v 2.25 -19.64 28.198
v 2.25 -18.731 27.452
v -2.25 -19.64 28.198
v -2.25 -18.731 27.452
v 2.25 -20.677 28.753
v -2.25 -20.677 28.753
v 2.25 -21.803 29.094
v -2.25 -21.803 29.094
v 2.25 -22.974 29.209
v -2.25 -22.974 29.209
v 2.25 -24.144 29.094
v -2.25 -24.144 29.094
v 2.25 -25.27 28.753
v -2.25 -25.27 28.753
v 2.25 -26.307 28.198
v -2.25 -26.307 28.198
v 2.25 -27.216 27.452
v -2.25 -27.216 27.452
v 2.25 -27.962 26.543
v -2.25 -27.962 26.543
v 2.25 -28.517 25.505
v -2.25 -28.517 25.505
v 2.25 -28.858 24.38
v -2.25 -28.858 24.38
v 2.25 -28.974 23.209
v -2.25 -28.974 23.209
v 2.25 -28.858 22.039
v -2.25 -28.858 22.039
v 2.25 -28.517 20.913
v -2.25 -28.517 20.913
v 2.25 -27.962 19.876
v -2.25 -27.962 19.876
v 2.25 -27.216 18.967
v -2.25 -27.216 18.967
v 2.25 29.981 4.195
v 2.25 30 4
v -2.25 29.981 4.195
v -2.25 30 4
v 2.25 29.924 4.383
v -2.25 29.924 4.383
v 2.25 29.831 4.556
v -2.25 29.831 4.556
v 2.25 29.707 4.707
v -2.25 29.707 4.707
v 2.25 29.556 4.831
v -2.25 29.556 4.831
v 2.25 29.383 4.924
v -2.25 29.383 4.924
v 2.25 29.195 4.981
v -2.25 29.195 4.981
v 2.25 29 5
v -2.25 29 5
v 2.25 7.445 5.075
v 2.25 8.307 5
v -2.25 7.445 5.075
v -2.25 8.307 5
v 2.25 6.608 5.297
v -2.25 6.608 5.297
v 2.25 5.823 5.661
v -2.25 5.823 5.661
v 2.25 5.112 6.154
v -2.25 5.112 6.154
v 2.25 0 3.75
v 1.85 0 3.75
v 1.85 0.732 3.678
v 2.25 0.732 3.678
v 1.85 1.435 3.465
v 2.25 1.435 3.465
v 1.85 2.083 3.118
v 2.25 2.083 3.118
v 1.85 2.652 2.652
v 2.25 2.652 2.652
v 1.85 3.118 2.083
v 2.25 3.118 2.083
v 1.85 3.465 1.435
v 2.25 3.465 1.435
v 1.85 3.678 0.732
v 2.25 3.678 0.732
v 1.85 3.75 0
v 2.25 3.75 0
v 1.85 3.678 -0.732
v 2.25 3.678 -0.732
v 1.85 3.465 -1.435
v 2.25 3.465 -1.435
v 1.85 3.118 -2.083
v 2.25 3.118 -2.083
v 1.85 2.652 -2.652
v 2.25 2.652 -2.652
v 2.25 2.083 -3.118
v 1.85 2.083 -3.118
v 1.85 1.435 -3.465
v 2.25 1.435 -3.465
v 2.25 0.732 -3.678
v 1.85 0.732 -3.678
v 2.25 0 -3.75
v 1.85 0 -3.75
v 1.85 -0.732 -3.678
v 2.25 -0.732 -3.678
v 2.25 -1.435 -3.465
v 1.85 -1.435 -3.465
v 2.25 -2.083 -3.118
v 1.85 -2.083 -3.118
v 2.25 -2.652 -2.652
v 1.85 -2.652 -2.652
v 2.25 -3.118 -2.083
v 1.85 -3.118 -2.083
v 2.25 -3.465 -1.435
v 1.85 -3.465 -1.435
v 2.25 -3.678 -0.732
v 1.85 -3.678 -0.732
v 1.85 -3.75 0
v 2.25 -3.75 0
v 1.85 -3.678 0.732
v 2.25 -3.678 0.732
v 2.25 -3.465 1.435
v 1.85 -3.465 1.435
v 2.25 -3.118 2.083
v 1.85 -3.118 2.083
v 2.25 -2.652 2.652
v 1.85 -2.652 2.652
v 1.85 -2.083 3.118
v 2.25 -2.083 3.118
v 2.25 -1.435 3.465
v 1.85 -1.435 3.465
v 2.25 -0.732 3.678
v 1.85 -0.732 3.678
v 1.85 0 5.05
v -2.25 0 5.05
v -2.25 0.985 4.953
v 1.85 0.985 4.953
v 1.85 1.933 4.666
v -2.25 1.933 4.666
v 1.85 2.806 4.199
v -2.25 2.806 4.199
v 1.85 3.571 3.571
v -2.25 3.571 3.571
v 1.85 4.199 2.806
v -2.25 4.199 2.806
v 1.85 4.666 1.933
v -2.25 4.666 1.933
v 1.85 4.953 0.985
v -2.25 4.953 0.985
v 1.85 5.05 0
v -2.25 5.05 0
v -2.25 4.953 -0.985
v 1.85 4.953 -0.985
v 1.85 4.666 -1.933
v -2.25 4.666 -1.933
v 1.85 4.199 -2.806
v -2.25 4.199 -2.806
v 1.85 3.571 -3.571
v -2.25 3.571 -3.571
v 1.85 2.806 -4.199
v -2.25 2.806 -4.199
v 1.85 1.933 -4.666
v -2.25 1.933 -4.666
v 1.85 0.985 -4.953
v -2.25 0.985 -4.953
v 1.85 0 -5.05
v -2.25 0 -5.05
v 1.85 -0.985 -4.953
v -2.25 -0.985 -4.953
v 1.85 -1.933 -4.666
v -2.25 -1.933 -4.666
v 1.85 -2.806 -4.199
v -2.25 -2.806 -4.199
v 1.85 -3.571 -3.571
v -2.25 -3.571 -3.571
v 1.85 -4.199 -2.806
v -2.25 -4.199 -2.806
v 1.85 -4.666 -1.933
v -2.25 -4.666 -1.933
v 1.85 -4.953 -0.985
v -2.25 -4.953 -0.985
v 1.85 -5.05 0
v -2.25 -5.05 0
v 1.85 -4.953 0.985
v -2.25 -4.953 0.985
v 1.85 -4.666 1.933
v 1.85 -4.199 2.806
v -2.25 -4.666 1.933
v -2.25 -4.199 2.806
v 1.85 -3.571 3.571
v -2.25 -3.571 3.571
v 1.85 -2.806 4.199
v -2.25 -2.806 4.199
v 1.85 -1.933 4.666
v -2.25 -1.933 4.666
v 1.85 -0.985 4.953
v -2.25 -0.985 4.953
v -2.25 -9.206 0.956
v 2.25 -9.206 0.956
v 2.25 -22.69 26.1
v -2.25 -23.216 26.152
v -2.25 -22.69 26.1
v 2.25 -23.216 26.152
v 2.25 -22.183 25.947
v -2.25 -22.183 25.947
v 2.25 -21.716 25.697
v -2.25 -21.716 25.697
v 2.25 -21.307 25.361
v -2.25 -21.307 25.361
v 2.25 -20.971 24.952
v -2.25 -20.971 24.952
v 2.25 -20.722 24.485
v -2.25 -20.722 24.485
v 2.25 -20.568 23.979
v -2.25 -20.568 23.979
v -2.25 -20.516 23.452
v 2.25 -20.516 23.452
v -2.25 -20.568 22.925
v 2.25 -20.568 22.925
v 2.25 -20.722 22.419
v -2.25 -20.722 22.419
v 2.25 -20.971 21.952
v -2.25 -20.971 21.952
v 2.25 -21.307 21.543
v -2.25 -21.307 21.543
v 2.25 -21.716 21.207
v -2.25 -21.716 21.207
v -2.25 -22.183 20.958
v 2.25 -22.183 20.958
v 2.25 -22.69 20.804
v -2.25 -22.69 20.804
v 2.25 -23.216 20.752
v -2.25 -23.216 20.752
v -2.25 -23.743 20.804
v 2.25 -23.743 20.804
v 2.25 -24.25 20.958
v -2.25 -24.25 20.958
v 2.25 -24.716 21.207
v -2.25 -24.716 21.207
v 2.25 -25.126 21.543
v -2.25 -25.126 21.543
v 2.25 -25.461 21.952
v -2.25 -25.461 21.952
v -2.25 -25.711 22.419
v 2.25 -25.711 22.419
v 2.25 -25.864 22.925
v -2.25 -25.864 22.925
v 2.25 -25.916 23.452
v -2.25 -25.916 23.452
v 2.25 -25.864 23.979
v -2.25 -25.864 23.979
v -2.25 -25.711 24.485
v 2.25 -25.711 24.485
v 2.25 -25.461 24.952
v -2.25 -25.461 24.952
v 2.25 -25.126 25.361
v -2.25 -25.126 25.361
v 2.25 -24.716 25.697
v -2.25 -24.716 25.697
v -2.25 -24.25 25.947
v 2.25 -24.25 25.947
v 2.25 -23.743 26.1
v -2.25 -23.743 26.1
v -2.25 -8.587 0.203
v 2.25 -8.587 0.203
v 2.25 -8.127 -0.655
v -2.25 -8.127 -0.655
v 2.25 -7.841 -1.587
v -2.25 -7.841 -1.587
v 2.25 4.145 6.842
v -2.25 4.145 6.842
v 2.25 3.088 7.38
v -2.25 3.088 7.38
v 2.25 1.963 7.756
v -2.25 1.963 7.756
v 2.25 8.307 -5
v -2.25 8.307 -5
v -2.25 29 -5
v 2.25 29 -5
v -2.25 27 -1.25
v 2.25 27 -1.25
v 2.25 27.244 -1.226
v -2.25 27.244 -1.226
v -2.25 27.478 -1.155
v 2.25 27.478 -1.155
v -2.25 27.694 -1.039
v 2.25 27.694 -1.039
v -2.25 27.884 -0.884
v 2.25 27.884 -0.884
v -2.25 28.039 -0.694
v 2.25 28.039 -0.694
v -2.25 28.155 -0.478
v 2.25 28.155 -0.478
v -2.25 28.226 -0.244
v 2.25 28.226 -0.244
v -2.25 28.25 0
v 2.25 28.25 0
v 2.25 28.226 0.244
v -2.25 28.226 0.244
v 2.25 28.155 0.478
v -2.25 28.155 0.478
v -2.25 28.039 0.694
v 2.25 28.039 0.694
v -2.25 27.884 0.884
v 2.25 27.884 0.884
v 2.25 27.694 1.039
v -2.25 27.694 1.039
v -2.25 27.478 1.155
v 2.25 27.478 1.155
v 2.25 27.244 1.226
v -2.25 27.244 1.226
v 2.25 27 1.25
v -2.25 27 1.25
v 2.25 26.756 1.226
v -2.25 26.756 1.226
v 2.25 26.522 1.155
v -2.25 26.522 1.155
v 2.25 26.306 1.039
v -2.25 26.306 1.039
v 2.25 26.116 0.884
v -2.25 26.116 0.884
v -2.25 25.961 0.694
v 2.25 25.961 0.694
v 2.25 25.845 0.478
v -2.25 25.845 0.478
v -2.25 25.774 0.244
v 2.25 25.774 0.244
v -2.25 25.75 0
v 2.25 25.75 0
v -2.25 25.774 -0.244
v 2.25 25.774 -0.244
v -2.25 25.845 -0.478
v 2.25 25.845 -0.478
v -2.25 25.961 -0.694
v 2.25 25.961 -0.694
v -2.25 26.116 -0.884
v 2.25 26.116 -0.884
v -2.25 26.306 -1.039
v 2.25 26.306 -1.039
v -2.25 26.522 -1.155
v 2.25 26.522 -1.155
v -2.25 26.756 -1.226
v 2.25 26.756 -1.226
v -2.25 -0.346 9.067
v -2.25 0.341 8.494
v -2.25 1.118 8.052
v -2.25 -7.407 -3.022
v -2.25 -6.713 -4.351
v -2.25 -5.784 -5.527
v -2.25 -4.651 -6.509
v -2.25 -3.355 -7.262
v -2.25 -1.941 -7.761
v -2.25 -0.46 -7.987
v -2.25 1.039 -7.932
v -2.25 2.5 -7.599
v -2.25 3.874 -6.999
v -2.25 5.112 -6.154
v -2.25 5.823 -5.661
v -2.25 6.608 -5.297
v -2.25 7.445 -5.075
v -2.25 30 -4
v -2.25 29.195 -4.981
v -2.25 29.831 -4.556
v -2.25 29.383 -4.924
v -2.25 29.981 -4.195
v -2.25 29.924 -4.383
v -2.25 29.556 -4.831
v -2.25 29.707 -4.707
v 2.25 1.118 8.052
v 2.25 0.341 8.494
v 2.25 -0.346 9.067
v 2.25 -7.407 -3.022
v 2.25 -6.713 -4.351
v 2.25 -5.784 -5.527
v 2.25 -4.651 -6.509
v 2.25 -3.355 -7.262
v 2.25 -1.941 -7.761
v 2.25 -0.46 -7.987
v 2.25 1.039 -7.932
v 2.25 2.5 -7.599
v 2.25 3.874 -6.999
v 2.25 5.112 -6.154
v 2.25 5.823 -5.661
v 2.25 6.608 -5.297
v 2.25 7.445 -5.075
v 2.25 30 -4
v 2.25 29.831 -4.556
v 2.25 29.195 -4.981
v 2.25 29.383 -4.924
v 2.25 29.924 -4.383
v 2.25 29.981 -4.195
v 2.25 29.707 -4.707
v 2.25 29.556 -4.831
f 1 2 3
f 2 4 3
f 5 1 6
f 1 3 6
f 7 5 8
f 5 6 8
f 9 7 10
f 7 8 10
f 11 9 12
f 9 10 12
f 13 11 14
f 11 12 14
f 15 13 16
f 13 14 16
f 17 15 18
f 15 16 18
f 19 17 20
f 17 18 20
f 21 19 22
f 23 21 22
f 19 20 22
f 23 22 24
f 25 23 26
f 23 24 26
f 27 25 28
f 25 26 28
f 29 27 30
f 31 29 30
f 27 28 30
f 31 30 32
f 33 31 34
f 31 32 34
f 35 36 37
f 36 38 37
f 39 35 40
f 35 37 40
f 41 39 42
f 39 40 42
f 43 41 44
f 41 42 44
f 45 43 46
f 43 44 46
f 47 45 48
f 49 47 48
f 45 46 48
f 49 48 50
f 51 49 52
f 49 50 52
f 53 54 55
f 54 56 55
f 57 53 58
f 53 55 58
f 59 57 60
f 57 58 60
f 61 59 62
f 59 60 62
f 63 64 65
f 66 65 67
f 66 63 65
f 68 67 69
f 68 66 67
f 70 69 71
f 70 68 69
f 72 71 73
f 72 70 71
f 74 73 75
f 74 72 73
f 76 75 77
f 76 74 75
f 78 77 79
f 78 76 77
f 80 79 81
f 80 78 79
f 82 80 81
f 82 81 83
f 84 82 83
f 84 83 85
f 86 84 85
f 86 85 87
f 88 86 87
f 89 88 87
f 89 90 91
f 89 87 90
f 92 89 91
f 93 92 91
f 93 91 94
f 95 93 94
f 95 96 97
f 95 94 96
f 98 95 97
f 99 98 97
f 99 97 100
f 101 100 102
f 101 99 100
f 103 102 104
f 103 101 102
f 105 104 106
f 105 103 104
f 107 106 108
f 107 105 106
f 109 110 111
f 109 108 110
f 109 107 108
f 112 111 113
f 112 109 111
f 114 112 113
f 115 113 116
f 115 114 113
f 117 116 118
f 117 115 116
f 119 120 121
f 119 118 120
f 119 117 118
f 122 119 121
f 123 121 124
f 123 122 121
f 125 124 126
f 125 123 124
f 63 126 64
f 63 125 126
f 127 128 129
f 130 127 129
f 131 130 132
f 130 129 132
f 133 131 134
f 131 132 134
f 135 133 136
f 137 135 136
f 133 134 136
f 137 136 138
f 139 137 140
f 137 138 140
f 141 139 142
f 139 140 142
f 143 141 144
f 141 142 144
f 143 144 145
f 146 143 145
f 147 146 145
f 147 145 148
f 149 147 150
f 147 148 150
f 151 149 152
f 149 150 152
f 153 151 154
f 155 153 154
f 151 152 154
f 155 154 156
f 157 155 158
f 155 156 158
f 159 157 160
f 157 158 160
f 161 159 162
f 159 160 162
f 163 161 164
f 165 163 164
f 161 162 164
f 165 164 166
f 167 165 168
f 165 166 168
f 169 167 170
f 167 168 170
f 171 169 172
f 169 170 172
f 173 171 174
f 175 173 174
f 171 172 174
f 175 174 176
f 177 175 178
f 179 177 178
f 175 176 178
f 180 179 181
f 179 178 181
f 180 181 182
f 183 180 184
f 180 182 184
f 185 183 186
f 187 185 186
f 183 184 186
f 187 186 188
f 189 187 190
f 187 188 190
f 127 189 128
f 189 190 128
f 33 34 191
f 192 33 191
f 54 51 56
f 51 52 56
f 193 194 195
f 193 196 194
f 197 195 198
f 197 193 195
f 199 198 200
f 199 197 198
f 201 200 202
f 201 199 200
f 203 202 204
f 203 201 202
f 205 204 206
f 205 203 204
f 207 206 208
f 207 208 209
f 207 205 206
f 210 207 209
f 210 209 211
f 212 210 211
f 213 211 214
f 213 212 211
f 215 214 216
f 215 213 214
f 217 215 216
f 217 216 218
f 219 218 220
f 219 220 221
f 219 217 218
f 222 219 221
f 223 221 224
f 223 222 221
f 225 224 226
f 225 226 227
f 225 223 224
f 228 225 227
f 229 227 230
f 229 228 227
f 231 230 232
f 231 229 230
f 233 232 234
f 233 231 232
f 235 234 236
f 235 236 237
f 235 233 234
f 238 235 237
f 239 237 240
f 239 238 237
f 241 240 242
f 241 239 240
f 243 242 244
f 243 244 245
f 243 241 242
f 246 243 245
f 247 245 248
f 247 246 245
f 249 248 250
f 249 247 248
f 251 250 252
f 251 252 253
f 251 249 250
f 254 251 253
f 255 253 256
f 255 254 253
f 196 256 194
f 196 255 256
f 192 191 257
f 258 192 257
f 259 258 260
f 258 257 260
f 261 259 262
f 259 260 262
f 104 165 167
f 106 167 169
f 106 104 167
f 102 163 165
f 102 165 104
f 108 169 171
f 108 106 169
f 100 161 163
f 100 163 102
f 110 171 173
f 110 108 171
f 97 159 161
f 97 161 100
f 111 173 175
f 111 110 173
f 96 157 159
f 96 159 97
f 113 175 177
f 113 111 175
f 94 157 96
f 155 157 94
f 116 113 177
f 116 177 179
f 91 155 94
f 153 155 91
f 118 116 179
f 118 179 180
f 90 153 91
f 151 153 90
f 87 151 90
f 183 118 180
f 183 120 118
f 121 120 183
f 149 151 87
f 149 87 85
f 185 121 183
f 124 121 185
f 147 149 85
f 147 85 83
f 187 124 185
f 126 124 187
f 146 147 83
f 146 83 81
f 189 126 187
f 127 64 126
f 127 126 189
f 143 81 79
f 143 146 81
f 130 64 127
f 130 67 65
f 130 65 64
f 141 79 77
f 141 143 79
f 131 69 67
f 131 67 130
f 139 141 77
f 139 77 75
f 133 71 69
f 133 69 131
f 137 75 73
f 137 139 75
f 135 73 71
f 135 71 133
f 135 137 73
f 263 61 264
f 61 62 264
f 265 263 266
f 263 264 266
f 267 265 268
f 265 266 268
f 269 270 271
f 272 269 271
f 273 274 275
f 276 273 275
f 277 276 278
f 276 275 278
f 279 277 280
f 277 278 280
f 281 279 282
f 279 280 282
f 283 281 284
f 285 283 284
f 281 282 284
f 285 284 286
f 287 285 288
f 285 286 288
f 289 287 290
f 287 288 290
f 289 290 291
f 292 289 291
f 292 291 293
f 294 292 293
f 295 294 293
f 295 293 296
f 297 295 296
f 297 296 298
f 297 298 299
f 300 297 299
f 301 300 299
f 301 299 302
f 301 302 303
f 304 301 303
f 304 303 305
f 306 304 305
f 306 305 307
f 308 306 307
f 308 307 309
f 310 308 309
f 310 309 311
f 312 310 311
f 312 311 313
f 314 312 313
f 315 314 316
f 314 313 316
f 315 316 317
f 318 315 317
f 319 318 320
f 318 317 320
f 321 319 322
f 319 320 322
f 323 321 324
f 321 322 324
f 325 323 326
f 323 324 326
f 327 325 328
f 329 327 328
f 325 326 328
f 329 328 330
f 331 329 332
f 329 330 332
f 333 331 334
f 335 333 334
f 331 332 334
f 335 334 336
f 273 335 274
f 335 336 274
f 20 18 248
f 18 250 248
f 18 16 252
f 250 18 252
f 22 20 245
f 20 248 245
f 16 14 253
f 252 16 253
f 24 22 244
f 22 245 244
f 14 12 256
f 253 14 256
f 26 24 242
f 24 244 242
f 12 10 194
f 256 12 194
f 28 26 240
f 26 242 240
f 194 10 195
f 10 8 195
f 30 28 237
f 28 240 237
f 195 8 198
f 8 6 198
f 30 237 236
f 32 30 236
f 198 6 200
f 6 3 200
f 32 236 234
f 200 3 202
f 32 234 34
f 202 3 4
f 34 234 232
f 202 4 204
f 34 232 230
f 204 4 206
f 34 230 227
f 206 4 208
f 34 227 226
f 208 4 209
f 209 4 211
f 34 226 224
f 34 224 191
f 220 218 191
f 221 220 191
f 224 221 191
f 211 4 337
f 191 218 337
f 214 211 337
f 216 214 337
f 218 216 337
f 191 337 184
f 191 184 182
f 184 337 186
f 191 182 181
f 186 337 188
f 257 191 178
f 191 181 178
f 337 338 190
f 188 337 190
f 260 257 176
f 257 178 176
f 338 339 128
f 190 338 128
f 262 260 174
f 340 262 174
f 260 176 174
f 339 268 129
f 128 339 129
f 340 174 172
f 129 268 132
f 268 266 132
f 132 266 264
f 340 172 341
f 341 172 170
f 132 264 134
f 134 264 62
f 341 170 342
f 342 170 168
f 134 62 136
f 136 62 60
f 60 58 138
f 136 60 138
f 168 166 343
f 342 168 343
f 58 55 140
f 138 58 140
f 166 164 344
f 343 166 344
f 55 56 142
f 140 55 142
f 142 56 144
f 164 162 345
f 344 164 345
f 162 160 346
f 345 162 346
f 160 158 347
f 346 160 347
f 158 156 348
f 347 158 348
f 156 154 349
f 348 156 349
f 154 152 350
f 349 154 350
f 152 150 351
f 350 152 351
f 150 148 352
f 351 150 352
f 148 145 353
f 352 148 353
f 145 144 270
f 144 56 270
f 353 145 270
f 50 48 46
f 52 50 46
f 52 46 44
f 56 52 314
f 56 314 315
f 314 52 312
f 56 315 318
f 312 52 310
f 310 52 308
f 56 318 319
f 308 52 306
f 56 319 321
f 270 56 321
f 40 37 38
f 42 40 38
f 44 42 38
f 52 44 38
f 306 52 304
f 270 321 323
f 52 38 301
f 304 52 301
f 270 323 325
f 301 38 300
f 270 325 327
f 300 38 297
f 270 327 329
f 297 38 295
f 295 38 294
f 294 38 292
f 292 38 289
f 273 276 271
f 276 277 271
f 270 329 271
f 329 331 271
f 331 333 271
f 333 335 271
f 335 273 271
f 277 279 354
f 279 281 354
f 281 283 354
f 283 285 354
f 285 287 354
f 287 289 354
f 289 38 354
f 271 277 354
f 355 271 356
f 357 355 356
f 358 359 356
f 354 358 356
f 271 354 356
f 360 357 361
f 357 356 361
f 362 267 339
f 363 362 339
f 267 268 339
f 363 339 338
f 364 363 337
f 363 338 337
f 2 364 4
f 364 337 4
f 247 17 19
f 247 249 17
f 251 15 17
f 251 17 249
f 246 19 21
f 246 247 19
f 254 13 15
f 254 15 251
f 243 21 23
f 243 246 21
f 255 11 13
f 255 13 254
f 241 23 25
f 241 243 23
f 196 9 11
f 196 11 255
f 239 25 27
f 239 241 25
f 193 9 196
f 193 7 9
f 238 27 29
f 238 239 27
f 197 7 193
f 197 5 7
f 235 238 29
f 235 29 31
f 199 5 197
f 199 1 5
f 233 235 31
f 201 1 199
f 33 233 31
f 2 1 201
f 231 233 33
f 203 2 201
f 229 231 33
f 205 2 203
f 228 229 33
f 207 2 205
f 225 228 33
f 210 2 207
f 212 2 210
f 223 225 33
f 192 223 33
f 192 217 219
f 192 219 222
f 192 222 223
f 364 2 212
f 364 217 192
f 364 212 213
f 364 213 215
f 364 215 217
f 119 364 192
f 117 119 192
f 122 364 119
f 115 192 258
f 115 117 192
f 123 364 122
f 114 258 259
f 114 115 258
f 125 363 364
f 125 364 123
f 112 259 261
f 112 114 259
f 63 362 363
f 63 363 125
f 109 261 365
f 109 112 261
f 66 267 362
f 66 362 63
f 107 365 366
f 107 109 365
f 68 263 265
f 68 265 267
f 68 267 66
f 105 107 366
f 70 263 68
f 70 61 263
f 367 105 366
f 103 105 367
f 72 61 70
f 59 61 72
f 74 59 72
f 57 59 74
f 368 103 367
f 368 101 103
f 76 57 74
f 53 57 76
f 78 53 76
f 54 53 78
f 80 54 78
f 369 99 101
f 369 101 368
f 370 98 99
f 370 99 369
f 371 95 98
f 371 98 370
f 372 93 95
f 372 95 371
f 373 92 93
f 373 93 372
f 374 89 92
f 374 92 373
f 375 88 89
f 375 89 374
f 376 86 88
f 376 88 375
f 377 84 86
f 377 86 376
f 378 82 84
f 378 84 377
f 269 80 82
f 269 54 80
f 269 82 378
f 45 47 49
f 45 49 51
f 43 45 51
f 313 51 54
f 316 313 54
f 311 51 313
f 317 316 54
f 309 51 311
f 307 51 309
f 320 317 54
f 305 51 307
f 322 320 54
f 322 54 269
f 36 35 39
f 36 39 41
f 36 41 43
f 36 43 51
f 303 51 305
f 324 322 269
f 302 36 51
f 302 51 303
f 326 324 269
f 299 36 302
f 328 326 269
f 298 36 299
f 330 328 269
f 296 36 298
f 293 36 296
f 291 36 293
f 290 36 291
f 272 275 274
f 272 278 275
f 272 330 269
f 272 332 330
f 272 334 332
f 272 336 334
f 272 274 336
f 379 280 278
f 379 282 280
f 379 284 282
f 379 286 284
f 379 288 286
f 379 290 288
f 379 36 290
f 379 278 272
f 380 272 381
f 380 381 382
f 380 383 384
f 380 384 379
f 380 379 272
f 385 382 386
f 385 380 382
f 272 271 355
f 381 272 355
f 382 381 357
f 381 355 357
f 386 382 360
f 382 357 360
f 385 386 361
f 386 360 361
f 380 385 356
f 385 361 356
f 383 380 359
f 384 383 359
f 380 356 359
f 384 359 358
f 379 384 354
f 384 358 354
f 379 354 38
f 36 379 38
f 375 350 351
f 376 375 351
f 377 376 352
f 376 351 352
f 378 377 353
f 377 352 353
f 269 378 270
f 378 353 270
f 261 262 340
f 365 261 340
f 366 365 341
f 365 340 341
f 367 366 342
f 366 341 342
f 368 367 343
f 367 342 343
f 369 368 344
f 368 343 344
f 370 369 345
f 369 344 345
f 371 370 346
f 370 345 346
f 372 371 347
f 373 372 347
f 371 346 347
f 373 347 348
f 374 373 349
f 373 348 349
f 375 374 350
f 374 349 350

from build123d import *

# Parameters (mm, degrees)
SKETCH_1_R          = 2.7
EXTRUDE_1_DEPTH     = 2.25
SKETCH_4_R          = 3.75
CUT_EXTRUDE_2_DEPTH = 5
SKETCH_7_R          = 5.05
CUT_EXTRUDE_4_DEPTH = 4.1
SKETCH_8_R          = 1.25
CUT_EXTRUDE_5_DEPTH = 6


with BuildPart() as part:
    # 草图1 → 凸台-拉伸1 (new body, symmetric)
    with BuildSketch(Plane.ZY):
        with BuildLine():
            Line((-4, 30), (4, 30))
            ThreePointArc((4, 30), (4.707106781, 29.707106781), (5, 29))
            Line((5, 29), (5, 8.306623863))
            ThreePointArc((5, 8.306623863), (5.297300284, 6.608208312), (6.153846154, 5.111768531))
            ThreePointArc((6.153846154, 5.111768531), (7.130688706, 3.626744901), (7.755507367, 1.962678138))
            ThreePointArc((7.755507367, 1.962678138), (8.255259703, 0.719581246), (9.067165566, -0.346181931))
            Line((9.067165566, -0.346181931), (27.451942184, -18.730958549))
            ThreePointArc((27.451942184, -18.730958549), (27.451942184, -27.216239924), (18.96666081, -27.216239924))
            Line((18.96666081, -27.216239924), (0.956494183, -9.206073297))
            ThreePointArc((0.956494183, -9.206073297), (-0.214644447, -8.335970475), (-1.587101368, -7.840989048))
            ThreePointArc((-1.587101368, -7.840989048), (-7.544802804, -2.660065909), (-6.153846154, 5.111768531))
            ThreePointArc((-6.153846154, 5.111768531), (-5.297300284, 6.608208312), (-5, 8.306623863))
            Line((-5, 8.306623863), (-5, 29))
            ThreePointArc((-5, 29), (-4.707106781, 29.707106781), (-4, 30))
        make_face()
        with Locations((23.452077304, -23.216375043)):
            Circle(SKETCH_1_R, mode=Mode.SUBTRACT)
    extrude(amount=EXTRUDE_1_DEPTH, both=True)

    # 草图4 → 切除-拉伸2 (cut)
    with BuildSketch(Plane.ZY.offset(-2.25)):
        Circle(SKETCH_4_R)
    extrude(amount=CUT_EXTRUDE_2_DEPTH, mode=Mode.SUBTRACT)

    # 草图7 → 切除-拉伸4 (cut)
    with BuildSketch(Plane.ZY.offset(2.25)):
        Circle(SKETCH_7_R)
    extrude(amount=-CUT_EXTRUDE_4_DEPTH, mode=Mode.SUBTRACT)

    # 草图8 → 切除-拉伸5 (cut)
    with BuildSketch(Plane(origin=(2.25, 0, 0), x_dir=(0, 0, -1), z_dir=(1, 0, 0))):
        with Locations((0, 27)):
            Circle(SKETCH_8_R)
    extrude(amount=-CUT_EXTRUDE_5_DEPTH, mode=Mode.SUBTRACT)


solid = part.part
